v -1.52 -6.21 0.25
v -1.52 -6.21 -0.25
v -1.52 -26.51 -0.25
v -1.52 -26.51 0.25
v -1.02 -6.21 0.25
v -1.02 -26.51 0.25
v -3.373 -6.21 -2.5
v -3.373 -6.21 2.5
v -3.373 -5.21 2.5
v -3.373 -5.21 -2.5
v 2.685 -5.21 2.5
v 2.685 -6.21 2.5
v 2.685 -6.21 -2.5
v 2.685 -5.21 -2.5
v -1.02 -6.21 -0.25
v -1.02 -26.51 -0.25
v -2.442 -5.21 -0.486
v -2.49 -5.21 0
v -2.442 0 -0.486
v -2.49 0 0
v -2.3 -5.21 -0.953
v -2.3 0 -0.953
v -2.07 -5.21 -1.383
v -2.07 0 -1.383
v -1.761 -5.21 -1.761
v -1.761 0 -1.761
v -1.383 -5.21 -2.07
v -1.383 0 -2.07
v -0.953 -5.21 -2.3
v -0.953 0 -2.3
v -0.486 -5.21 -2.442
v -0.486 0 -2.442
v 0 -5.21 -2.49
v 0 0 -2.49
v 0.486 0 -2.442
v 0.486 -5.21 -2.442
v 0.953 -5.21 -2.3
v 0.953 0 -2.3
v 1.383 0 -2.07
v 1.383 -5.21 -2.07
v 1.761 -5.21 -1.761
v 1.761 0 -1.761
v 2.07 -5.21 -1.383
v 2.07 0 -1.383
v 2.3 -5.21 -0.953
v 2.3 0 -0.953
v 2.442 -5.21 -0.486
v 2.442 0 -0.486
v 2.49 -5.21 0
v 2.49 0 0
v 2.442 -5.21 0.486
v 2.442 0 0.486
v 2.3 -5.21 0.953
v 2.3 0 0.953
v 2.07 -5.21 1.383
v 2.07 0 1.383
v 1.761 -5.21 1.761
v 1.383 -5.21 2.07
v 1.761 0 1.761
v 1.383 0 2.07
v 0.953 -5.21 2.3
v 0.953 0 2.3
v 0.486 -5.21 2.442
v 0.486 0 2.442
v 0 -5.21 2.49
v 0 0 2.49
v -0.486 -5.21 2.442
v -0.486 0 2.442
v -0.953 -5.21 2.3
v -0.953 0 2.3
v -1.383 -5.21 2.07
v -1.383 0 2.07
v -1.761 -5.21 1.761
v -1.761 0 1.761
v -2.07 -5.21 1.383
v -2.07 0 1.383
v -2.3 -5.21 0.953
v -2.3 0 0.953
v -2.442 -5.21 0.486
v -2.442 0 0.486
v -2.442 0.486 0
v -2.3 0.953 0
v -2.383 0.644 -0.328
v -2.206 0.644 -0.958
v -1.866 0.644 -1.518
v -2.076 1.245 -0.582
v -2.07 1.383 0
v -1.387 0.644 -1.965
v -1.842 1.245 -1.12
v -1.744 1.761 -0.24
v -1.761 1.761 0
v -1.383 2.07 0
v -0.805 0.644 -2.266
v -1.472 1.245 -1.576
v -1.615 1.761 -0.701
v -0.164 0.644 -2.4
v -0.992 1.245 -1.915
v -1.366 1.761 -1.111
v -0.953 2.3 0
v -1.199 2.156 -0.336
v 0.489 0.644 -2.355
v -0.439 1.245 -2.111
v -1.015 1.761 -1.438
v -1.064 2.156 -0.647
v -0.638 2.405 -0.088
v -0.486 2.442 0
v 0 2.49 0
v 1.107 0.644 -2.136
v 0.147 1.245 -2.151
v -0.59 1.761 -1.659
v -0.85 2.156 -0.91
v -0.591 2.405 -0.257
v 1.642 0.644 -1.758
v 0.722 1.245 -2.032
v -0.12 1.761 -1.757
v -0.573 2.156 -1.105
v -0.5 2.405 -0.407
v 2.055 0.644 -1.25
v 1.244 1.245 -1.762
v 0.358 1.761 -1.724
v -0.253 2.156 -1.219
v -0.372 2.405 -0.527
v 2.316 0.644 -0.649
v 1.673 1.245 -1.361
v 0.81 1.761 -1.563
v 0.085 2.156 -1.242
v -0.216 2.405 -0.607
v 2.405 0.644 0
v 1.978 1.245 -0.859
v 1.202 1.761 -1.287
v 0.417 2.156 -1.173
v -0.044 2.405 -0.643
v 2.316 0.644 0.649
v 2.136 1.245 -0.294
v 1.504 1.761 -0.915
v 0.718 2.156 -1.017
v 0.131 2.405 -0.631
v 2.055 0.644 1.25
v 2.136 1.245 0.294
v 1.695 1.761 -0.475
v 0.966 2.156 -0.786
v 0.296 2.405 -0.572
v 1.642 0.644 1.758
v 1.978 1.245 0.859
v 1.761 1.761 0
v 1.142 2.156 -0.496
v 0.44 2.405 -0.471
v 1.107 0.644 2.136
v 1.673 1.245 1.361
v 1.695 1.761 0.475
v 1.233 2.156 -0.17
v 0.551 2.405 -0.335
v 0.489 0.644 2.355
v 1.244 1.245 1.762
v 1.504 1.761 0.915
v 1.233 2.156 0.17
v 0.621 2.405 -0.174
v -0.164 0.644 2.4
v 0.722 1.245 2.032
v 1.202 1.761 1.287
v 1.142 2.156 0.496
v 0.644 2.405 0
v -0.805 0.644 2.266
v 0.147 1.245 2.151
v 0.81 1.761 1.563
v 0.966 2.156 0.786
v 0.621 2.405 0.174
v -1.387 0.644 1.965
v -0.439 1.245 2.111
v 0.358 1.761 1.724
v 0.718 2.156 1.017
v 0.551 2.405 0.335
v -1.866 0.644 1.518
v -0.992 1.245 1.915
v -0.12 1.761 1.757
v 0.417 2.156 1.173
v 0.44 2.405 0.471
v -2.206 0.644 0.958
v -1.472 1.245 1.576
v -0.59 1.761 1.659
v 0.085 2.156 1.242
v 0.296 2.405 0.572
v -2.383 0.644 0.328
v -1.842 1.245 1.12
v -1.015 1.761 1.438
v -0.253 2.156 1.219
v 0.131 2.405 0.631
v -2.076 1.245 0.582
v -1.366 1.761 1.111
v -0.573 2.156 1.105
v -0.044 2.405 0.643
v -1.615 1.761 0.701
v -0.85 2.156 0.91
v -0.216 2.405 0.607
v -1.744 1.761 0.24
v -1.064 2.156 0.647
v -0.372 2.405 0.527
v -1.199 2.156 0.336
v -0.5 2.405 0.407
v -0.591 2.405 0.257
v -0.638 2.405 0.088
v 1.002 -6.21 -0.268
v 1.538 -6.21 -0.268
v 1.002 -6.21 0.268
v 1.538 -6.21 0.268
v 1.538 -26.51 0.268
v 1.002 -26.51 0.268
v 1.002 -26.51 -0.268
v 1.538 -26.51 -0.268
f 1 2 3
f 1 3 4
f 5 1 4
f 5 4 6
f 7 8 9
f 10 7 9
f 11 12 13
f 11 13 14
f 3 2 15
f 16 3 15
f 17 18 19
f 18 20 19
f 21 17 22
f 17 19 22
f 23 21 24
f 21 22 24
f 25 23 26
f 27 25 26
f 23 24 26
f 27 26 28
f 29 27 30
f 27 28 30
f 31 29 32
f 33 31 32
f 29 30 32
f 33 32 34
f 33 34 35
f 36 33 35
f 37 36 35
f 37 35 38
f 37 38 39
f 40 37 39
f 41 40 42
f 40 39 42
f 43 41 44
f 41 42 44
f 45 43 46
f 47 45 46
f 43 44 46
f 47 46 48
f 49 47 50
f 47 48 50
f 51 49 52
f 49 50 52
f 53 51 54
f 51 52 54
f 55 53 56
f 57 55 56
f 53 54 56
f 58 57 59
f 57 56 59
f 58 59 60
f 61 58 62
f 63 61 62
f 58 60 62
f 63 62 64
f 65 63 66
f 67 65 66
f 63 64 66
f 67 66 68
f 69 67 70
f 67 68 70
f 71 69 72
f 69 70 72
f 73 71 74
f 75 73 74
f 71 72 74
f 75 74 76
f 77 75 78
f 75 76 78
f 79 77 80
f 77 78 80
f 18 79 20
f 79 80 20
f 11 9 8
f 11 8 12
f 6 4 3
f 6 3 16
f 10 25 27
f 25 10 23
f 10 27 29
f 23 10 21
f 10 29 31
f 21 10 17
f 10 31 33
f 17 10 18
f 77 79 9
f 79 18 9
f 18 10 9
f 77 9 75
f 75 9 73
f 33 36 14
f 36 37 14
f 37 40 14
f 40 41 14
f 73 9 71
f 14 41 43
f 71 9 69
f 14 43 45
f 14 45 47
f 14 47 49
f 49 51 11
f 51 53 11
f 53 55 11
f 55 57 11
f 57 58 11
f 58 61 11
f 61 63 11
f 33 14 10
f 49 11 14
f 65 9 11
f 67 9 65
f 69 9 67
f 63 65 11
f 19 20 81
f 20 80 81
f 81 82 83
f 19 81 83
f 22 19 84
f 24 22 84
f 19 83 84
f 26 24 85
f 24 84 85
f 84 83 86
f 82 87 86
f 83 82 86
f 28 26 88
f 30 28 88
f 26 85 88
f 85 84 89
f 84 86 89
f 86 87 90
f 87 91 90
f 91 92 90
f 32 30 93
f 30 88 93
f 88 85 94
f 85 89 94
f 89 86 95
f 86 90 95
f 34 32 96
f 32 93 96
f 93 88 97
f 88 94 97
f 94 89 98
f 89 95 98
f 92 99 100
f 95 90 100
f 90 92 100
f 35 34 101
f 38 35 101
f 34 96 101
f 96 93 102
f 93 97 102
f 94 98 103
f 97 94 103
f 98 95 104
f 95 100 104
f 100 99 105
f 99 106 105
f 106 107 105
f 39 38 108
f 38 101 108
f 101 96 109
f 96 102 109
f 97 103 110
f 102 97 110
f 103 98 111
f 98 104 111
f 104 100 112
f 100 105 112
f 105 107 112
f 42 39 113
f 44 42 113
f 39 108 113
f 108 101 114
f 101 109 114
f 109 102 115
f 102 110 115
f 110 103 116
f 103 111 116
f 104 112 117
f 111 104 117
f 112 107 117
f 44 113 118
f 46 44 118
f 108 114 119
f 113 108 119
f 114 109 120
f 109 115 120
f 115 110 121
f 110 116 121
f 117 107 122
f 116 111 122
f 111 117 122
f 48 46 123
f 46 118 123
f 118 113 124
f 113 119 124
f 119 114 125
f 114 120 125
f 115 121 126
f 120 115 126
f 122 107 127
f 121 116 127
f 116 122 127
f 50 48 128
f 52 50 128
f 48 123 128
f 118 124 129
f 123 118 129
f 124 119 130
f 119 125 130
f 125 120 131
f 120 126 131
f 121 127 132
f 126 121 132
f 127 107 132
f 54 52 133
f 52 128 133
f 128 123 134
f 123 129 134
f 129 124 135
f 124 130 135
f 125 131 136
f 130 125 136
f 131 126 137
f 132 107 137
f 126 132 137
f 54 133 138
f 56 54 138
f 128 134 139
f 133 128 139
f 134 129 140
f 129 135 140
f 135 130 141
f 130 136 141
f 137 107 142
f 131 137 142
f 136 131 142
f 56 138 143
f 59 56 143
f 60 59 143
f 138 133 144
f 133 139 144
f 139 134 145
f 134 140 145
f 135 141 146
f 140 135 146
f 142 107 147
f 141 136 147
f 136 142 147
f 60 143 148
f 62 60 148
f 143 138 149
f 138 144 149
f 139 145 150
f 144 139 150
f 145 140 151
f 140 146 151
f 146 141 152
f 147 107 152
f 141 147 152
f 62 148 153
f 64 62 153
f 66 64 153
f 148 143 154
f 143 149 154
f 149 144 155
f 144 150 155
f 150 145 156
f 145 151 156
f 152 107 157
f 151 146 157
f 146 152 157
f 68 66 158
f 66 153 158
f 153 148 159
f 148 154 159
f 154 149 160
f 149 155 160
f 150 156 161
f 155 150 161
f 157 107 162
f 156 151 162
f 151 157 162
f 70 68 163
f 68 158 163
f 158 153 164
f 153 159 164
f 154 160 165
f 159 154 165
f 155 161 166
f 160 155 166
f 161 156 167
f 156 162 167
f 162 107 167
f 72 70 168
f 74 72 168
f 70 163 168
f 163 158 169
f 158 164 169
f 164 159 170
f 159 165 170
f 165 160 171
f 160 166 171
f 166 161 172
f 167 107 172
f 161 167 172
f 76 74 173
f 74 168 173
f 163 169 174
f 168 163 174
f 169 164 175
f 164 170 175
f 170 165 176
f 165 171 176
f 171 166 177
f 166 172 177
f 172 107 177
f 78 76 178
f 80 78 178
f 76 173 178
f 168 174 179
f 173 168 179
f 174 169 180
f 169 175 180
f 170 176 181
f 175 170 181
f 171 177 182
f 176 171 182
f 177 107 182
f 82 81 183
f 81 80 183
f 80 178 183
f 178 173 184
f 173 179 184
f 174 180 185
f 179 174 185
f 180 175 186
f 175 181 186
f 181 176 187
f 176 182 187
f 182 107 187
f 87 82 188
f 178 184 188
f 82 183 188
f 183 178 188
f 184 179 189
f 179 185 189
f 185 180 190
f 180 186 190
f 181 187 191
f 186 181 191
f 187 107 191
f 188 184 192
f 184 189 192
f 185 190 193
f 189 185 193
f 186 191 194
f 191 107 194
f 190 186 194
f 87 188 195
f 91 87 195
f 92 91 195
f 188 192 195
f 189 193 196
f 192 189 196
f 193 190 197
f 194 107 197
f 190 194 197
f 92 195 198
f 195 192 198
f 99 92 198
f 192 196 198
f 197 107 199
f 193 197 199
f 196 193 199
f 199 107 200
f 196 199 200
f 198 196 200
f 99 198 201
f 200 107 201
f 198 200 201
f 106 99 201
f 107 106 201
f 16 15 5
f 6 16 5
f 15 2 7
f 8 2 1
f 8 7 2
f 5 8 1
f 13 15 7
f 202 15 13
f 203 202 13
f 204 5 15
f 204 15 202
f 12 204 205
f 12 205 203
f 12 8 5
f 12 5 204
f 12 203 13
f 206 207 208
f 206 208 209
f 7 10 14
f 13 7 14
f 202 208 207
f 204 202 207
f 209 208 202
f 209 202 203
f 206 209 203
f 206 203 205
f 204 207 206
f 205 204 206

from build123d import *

# Parameters (mm, degrees)
SKETCH1_W           = 2.49
SKETCH1_H           = 5.21
SKETCH2_W           = 6.057828243
SKETCH2_H           = 1
BOSS_EXTRUDE2_DEPTH = 2.5
SKETCH4_W           = 0.5
SKETCH4_H           = 0.5
SKETCH4_W_2         = 0.535652732
SKETCH4_H_2         = 0.535652732
BOSS_EXTRUDE3_DEPTH = 20.3


with BuildPart() as part:
    # Sketch1 → Revolve3 (revolve)
    with BuildSketch(Plane.XY, mode=Mode.PRIVATE) as revolve3_sk:
        with Locations((1.245, -2.605)):
            Rectangle(SKETCH1_W, SKETCH1_H)
        with BuildLine():
            Line((0, 0), (2.49, 0))
            ThreePointArc((2.49, 0), (1.760695885, 1.760695885), (0, 2.49))
            Line((0, 2.49), (0, 0))
        make_face()
    revolve(revolve3_sk.sketch.rotate(Axis((0, 2.49, 0), (0, -1, 0)), 180), axis=Axis((0, 2.49, 0), (0, -1, 0)))

    # Sketch2 → Boss-Extrude2 (add, symmetric)
    with BuildSketch(Plane.XY):
        with Locations((-0.344367629, -5.71)):
            Rectangle(SKETCH2_W, SKETCH2_H)
    extrude(amount=BOSS_EXTRUDE2_DEPTH, both=True)

    # Sketch4 → Boss-Extrude3 (add)
    with BuildSketch(Plane.XZ.offset(6.21)):
        with Locations((-1.27, 0)):
            Rectangle(SKETCH4_W, SKETCH4_H)
        with Locations((1.27, 0)):
            Rectangle(SKETCH4_W_2, SKETCH4_H_2)
    extrude(amount=BOSS_EXTRUDE3_DEPTH)


solid = part.part
